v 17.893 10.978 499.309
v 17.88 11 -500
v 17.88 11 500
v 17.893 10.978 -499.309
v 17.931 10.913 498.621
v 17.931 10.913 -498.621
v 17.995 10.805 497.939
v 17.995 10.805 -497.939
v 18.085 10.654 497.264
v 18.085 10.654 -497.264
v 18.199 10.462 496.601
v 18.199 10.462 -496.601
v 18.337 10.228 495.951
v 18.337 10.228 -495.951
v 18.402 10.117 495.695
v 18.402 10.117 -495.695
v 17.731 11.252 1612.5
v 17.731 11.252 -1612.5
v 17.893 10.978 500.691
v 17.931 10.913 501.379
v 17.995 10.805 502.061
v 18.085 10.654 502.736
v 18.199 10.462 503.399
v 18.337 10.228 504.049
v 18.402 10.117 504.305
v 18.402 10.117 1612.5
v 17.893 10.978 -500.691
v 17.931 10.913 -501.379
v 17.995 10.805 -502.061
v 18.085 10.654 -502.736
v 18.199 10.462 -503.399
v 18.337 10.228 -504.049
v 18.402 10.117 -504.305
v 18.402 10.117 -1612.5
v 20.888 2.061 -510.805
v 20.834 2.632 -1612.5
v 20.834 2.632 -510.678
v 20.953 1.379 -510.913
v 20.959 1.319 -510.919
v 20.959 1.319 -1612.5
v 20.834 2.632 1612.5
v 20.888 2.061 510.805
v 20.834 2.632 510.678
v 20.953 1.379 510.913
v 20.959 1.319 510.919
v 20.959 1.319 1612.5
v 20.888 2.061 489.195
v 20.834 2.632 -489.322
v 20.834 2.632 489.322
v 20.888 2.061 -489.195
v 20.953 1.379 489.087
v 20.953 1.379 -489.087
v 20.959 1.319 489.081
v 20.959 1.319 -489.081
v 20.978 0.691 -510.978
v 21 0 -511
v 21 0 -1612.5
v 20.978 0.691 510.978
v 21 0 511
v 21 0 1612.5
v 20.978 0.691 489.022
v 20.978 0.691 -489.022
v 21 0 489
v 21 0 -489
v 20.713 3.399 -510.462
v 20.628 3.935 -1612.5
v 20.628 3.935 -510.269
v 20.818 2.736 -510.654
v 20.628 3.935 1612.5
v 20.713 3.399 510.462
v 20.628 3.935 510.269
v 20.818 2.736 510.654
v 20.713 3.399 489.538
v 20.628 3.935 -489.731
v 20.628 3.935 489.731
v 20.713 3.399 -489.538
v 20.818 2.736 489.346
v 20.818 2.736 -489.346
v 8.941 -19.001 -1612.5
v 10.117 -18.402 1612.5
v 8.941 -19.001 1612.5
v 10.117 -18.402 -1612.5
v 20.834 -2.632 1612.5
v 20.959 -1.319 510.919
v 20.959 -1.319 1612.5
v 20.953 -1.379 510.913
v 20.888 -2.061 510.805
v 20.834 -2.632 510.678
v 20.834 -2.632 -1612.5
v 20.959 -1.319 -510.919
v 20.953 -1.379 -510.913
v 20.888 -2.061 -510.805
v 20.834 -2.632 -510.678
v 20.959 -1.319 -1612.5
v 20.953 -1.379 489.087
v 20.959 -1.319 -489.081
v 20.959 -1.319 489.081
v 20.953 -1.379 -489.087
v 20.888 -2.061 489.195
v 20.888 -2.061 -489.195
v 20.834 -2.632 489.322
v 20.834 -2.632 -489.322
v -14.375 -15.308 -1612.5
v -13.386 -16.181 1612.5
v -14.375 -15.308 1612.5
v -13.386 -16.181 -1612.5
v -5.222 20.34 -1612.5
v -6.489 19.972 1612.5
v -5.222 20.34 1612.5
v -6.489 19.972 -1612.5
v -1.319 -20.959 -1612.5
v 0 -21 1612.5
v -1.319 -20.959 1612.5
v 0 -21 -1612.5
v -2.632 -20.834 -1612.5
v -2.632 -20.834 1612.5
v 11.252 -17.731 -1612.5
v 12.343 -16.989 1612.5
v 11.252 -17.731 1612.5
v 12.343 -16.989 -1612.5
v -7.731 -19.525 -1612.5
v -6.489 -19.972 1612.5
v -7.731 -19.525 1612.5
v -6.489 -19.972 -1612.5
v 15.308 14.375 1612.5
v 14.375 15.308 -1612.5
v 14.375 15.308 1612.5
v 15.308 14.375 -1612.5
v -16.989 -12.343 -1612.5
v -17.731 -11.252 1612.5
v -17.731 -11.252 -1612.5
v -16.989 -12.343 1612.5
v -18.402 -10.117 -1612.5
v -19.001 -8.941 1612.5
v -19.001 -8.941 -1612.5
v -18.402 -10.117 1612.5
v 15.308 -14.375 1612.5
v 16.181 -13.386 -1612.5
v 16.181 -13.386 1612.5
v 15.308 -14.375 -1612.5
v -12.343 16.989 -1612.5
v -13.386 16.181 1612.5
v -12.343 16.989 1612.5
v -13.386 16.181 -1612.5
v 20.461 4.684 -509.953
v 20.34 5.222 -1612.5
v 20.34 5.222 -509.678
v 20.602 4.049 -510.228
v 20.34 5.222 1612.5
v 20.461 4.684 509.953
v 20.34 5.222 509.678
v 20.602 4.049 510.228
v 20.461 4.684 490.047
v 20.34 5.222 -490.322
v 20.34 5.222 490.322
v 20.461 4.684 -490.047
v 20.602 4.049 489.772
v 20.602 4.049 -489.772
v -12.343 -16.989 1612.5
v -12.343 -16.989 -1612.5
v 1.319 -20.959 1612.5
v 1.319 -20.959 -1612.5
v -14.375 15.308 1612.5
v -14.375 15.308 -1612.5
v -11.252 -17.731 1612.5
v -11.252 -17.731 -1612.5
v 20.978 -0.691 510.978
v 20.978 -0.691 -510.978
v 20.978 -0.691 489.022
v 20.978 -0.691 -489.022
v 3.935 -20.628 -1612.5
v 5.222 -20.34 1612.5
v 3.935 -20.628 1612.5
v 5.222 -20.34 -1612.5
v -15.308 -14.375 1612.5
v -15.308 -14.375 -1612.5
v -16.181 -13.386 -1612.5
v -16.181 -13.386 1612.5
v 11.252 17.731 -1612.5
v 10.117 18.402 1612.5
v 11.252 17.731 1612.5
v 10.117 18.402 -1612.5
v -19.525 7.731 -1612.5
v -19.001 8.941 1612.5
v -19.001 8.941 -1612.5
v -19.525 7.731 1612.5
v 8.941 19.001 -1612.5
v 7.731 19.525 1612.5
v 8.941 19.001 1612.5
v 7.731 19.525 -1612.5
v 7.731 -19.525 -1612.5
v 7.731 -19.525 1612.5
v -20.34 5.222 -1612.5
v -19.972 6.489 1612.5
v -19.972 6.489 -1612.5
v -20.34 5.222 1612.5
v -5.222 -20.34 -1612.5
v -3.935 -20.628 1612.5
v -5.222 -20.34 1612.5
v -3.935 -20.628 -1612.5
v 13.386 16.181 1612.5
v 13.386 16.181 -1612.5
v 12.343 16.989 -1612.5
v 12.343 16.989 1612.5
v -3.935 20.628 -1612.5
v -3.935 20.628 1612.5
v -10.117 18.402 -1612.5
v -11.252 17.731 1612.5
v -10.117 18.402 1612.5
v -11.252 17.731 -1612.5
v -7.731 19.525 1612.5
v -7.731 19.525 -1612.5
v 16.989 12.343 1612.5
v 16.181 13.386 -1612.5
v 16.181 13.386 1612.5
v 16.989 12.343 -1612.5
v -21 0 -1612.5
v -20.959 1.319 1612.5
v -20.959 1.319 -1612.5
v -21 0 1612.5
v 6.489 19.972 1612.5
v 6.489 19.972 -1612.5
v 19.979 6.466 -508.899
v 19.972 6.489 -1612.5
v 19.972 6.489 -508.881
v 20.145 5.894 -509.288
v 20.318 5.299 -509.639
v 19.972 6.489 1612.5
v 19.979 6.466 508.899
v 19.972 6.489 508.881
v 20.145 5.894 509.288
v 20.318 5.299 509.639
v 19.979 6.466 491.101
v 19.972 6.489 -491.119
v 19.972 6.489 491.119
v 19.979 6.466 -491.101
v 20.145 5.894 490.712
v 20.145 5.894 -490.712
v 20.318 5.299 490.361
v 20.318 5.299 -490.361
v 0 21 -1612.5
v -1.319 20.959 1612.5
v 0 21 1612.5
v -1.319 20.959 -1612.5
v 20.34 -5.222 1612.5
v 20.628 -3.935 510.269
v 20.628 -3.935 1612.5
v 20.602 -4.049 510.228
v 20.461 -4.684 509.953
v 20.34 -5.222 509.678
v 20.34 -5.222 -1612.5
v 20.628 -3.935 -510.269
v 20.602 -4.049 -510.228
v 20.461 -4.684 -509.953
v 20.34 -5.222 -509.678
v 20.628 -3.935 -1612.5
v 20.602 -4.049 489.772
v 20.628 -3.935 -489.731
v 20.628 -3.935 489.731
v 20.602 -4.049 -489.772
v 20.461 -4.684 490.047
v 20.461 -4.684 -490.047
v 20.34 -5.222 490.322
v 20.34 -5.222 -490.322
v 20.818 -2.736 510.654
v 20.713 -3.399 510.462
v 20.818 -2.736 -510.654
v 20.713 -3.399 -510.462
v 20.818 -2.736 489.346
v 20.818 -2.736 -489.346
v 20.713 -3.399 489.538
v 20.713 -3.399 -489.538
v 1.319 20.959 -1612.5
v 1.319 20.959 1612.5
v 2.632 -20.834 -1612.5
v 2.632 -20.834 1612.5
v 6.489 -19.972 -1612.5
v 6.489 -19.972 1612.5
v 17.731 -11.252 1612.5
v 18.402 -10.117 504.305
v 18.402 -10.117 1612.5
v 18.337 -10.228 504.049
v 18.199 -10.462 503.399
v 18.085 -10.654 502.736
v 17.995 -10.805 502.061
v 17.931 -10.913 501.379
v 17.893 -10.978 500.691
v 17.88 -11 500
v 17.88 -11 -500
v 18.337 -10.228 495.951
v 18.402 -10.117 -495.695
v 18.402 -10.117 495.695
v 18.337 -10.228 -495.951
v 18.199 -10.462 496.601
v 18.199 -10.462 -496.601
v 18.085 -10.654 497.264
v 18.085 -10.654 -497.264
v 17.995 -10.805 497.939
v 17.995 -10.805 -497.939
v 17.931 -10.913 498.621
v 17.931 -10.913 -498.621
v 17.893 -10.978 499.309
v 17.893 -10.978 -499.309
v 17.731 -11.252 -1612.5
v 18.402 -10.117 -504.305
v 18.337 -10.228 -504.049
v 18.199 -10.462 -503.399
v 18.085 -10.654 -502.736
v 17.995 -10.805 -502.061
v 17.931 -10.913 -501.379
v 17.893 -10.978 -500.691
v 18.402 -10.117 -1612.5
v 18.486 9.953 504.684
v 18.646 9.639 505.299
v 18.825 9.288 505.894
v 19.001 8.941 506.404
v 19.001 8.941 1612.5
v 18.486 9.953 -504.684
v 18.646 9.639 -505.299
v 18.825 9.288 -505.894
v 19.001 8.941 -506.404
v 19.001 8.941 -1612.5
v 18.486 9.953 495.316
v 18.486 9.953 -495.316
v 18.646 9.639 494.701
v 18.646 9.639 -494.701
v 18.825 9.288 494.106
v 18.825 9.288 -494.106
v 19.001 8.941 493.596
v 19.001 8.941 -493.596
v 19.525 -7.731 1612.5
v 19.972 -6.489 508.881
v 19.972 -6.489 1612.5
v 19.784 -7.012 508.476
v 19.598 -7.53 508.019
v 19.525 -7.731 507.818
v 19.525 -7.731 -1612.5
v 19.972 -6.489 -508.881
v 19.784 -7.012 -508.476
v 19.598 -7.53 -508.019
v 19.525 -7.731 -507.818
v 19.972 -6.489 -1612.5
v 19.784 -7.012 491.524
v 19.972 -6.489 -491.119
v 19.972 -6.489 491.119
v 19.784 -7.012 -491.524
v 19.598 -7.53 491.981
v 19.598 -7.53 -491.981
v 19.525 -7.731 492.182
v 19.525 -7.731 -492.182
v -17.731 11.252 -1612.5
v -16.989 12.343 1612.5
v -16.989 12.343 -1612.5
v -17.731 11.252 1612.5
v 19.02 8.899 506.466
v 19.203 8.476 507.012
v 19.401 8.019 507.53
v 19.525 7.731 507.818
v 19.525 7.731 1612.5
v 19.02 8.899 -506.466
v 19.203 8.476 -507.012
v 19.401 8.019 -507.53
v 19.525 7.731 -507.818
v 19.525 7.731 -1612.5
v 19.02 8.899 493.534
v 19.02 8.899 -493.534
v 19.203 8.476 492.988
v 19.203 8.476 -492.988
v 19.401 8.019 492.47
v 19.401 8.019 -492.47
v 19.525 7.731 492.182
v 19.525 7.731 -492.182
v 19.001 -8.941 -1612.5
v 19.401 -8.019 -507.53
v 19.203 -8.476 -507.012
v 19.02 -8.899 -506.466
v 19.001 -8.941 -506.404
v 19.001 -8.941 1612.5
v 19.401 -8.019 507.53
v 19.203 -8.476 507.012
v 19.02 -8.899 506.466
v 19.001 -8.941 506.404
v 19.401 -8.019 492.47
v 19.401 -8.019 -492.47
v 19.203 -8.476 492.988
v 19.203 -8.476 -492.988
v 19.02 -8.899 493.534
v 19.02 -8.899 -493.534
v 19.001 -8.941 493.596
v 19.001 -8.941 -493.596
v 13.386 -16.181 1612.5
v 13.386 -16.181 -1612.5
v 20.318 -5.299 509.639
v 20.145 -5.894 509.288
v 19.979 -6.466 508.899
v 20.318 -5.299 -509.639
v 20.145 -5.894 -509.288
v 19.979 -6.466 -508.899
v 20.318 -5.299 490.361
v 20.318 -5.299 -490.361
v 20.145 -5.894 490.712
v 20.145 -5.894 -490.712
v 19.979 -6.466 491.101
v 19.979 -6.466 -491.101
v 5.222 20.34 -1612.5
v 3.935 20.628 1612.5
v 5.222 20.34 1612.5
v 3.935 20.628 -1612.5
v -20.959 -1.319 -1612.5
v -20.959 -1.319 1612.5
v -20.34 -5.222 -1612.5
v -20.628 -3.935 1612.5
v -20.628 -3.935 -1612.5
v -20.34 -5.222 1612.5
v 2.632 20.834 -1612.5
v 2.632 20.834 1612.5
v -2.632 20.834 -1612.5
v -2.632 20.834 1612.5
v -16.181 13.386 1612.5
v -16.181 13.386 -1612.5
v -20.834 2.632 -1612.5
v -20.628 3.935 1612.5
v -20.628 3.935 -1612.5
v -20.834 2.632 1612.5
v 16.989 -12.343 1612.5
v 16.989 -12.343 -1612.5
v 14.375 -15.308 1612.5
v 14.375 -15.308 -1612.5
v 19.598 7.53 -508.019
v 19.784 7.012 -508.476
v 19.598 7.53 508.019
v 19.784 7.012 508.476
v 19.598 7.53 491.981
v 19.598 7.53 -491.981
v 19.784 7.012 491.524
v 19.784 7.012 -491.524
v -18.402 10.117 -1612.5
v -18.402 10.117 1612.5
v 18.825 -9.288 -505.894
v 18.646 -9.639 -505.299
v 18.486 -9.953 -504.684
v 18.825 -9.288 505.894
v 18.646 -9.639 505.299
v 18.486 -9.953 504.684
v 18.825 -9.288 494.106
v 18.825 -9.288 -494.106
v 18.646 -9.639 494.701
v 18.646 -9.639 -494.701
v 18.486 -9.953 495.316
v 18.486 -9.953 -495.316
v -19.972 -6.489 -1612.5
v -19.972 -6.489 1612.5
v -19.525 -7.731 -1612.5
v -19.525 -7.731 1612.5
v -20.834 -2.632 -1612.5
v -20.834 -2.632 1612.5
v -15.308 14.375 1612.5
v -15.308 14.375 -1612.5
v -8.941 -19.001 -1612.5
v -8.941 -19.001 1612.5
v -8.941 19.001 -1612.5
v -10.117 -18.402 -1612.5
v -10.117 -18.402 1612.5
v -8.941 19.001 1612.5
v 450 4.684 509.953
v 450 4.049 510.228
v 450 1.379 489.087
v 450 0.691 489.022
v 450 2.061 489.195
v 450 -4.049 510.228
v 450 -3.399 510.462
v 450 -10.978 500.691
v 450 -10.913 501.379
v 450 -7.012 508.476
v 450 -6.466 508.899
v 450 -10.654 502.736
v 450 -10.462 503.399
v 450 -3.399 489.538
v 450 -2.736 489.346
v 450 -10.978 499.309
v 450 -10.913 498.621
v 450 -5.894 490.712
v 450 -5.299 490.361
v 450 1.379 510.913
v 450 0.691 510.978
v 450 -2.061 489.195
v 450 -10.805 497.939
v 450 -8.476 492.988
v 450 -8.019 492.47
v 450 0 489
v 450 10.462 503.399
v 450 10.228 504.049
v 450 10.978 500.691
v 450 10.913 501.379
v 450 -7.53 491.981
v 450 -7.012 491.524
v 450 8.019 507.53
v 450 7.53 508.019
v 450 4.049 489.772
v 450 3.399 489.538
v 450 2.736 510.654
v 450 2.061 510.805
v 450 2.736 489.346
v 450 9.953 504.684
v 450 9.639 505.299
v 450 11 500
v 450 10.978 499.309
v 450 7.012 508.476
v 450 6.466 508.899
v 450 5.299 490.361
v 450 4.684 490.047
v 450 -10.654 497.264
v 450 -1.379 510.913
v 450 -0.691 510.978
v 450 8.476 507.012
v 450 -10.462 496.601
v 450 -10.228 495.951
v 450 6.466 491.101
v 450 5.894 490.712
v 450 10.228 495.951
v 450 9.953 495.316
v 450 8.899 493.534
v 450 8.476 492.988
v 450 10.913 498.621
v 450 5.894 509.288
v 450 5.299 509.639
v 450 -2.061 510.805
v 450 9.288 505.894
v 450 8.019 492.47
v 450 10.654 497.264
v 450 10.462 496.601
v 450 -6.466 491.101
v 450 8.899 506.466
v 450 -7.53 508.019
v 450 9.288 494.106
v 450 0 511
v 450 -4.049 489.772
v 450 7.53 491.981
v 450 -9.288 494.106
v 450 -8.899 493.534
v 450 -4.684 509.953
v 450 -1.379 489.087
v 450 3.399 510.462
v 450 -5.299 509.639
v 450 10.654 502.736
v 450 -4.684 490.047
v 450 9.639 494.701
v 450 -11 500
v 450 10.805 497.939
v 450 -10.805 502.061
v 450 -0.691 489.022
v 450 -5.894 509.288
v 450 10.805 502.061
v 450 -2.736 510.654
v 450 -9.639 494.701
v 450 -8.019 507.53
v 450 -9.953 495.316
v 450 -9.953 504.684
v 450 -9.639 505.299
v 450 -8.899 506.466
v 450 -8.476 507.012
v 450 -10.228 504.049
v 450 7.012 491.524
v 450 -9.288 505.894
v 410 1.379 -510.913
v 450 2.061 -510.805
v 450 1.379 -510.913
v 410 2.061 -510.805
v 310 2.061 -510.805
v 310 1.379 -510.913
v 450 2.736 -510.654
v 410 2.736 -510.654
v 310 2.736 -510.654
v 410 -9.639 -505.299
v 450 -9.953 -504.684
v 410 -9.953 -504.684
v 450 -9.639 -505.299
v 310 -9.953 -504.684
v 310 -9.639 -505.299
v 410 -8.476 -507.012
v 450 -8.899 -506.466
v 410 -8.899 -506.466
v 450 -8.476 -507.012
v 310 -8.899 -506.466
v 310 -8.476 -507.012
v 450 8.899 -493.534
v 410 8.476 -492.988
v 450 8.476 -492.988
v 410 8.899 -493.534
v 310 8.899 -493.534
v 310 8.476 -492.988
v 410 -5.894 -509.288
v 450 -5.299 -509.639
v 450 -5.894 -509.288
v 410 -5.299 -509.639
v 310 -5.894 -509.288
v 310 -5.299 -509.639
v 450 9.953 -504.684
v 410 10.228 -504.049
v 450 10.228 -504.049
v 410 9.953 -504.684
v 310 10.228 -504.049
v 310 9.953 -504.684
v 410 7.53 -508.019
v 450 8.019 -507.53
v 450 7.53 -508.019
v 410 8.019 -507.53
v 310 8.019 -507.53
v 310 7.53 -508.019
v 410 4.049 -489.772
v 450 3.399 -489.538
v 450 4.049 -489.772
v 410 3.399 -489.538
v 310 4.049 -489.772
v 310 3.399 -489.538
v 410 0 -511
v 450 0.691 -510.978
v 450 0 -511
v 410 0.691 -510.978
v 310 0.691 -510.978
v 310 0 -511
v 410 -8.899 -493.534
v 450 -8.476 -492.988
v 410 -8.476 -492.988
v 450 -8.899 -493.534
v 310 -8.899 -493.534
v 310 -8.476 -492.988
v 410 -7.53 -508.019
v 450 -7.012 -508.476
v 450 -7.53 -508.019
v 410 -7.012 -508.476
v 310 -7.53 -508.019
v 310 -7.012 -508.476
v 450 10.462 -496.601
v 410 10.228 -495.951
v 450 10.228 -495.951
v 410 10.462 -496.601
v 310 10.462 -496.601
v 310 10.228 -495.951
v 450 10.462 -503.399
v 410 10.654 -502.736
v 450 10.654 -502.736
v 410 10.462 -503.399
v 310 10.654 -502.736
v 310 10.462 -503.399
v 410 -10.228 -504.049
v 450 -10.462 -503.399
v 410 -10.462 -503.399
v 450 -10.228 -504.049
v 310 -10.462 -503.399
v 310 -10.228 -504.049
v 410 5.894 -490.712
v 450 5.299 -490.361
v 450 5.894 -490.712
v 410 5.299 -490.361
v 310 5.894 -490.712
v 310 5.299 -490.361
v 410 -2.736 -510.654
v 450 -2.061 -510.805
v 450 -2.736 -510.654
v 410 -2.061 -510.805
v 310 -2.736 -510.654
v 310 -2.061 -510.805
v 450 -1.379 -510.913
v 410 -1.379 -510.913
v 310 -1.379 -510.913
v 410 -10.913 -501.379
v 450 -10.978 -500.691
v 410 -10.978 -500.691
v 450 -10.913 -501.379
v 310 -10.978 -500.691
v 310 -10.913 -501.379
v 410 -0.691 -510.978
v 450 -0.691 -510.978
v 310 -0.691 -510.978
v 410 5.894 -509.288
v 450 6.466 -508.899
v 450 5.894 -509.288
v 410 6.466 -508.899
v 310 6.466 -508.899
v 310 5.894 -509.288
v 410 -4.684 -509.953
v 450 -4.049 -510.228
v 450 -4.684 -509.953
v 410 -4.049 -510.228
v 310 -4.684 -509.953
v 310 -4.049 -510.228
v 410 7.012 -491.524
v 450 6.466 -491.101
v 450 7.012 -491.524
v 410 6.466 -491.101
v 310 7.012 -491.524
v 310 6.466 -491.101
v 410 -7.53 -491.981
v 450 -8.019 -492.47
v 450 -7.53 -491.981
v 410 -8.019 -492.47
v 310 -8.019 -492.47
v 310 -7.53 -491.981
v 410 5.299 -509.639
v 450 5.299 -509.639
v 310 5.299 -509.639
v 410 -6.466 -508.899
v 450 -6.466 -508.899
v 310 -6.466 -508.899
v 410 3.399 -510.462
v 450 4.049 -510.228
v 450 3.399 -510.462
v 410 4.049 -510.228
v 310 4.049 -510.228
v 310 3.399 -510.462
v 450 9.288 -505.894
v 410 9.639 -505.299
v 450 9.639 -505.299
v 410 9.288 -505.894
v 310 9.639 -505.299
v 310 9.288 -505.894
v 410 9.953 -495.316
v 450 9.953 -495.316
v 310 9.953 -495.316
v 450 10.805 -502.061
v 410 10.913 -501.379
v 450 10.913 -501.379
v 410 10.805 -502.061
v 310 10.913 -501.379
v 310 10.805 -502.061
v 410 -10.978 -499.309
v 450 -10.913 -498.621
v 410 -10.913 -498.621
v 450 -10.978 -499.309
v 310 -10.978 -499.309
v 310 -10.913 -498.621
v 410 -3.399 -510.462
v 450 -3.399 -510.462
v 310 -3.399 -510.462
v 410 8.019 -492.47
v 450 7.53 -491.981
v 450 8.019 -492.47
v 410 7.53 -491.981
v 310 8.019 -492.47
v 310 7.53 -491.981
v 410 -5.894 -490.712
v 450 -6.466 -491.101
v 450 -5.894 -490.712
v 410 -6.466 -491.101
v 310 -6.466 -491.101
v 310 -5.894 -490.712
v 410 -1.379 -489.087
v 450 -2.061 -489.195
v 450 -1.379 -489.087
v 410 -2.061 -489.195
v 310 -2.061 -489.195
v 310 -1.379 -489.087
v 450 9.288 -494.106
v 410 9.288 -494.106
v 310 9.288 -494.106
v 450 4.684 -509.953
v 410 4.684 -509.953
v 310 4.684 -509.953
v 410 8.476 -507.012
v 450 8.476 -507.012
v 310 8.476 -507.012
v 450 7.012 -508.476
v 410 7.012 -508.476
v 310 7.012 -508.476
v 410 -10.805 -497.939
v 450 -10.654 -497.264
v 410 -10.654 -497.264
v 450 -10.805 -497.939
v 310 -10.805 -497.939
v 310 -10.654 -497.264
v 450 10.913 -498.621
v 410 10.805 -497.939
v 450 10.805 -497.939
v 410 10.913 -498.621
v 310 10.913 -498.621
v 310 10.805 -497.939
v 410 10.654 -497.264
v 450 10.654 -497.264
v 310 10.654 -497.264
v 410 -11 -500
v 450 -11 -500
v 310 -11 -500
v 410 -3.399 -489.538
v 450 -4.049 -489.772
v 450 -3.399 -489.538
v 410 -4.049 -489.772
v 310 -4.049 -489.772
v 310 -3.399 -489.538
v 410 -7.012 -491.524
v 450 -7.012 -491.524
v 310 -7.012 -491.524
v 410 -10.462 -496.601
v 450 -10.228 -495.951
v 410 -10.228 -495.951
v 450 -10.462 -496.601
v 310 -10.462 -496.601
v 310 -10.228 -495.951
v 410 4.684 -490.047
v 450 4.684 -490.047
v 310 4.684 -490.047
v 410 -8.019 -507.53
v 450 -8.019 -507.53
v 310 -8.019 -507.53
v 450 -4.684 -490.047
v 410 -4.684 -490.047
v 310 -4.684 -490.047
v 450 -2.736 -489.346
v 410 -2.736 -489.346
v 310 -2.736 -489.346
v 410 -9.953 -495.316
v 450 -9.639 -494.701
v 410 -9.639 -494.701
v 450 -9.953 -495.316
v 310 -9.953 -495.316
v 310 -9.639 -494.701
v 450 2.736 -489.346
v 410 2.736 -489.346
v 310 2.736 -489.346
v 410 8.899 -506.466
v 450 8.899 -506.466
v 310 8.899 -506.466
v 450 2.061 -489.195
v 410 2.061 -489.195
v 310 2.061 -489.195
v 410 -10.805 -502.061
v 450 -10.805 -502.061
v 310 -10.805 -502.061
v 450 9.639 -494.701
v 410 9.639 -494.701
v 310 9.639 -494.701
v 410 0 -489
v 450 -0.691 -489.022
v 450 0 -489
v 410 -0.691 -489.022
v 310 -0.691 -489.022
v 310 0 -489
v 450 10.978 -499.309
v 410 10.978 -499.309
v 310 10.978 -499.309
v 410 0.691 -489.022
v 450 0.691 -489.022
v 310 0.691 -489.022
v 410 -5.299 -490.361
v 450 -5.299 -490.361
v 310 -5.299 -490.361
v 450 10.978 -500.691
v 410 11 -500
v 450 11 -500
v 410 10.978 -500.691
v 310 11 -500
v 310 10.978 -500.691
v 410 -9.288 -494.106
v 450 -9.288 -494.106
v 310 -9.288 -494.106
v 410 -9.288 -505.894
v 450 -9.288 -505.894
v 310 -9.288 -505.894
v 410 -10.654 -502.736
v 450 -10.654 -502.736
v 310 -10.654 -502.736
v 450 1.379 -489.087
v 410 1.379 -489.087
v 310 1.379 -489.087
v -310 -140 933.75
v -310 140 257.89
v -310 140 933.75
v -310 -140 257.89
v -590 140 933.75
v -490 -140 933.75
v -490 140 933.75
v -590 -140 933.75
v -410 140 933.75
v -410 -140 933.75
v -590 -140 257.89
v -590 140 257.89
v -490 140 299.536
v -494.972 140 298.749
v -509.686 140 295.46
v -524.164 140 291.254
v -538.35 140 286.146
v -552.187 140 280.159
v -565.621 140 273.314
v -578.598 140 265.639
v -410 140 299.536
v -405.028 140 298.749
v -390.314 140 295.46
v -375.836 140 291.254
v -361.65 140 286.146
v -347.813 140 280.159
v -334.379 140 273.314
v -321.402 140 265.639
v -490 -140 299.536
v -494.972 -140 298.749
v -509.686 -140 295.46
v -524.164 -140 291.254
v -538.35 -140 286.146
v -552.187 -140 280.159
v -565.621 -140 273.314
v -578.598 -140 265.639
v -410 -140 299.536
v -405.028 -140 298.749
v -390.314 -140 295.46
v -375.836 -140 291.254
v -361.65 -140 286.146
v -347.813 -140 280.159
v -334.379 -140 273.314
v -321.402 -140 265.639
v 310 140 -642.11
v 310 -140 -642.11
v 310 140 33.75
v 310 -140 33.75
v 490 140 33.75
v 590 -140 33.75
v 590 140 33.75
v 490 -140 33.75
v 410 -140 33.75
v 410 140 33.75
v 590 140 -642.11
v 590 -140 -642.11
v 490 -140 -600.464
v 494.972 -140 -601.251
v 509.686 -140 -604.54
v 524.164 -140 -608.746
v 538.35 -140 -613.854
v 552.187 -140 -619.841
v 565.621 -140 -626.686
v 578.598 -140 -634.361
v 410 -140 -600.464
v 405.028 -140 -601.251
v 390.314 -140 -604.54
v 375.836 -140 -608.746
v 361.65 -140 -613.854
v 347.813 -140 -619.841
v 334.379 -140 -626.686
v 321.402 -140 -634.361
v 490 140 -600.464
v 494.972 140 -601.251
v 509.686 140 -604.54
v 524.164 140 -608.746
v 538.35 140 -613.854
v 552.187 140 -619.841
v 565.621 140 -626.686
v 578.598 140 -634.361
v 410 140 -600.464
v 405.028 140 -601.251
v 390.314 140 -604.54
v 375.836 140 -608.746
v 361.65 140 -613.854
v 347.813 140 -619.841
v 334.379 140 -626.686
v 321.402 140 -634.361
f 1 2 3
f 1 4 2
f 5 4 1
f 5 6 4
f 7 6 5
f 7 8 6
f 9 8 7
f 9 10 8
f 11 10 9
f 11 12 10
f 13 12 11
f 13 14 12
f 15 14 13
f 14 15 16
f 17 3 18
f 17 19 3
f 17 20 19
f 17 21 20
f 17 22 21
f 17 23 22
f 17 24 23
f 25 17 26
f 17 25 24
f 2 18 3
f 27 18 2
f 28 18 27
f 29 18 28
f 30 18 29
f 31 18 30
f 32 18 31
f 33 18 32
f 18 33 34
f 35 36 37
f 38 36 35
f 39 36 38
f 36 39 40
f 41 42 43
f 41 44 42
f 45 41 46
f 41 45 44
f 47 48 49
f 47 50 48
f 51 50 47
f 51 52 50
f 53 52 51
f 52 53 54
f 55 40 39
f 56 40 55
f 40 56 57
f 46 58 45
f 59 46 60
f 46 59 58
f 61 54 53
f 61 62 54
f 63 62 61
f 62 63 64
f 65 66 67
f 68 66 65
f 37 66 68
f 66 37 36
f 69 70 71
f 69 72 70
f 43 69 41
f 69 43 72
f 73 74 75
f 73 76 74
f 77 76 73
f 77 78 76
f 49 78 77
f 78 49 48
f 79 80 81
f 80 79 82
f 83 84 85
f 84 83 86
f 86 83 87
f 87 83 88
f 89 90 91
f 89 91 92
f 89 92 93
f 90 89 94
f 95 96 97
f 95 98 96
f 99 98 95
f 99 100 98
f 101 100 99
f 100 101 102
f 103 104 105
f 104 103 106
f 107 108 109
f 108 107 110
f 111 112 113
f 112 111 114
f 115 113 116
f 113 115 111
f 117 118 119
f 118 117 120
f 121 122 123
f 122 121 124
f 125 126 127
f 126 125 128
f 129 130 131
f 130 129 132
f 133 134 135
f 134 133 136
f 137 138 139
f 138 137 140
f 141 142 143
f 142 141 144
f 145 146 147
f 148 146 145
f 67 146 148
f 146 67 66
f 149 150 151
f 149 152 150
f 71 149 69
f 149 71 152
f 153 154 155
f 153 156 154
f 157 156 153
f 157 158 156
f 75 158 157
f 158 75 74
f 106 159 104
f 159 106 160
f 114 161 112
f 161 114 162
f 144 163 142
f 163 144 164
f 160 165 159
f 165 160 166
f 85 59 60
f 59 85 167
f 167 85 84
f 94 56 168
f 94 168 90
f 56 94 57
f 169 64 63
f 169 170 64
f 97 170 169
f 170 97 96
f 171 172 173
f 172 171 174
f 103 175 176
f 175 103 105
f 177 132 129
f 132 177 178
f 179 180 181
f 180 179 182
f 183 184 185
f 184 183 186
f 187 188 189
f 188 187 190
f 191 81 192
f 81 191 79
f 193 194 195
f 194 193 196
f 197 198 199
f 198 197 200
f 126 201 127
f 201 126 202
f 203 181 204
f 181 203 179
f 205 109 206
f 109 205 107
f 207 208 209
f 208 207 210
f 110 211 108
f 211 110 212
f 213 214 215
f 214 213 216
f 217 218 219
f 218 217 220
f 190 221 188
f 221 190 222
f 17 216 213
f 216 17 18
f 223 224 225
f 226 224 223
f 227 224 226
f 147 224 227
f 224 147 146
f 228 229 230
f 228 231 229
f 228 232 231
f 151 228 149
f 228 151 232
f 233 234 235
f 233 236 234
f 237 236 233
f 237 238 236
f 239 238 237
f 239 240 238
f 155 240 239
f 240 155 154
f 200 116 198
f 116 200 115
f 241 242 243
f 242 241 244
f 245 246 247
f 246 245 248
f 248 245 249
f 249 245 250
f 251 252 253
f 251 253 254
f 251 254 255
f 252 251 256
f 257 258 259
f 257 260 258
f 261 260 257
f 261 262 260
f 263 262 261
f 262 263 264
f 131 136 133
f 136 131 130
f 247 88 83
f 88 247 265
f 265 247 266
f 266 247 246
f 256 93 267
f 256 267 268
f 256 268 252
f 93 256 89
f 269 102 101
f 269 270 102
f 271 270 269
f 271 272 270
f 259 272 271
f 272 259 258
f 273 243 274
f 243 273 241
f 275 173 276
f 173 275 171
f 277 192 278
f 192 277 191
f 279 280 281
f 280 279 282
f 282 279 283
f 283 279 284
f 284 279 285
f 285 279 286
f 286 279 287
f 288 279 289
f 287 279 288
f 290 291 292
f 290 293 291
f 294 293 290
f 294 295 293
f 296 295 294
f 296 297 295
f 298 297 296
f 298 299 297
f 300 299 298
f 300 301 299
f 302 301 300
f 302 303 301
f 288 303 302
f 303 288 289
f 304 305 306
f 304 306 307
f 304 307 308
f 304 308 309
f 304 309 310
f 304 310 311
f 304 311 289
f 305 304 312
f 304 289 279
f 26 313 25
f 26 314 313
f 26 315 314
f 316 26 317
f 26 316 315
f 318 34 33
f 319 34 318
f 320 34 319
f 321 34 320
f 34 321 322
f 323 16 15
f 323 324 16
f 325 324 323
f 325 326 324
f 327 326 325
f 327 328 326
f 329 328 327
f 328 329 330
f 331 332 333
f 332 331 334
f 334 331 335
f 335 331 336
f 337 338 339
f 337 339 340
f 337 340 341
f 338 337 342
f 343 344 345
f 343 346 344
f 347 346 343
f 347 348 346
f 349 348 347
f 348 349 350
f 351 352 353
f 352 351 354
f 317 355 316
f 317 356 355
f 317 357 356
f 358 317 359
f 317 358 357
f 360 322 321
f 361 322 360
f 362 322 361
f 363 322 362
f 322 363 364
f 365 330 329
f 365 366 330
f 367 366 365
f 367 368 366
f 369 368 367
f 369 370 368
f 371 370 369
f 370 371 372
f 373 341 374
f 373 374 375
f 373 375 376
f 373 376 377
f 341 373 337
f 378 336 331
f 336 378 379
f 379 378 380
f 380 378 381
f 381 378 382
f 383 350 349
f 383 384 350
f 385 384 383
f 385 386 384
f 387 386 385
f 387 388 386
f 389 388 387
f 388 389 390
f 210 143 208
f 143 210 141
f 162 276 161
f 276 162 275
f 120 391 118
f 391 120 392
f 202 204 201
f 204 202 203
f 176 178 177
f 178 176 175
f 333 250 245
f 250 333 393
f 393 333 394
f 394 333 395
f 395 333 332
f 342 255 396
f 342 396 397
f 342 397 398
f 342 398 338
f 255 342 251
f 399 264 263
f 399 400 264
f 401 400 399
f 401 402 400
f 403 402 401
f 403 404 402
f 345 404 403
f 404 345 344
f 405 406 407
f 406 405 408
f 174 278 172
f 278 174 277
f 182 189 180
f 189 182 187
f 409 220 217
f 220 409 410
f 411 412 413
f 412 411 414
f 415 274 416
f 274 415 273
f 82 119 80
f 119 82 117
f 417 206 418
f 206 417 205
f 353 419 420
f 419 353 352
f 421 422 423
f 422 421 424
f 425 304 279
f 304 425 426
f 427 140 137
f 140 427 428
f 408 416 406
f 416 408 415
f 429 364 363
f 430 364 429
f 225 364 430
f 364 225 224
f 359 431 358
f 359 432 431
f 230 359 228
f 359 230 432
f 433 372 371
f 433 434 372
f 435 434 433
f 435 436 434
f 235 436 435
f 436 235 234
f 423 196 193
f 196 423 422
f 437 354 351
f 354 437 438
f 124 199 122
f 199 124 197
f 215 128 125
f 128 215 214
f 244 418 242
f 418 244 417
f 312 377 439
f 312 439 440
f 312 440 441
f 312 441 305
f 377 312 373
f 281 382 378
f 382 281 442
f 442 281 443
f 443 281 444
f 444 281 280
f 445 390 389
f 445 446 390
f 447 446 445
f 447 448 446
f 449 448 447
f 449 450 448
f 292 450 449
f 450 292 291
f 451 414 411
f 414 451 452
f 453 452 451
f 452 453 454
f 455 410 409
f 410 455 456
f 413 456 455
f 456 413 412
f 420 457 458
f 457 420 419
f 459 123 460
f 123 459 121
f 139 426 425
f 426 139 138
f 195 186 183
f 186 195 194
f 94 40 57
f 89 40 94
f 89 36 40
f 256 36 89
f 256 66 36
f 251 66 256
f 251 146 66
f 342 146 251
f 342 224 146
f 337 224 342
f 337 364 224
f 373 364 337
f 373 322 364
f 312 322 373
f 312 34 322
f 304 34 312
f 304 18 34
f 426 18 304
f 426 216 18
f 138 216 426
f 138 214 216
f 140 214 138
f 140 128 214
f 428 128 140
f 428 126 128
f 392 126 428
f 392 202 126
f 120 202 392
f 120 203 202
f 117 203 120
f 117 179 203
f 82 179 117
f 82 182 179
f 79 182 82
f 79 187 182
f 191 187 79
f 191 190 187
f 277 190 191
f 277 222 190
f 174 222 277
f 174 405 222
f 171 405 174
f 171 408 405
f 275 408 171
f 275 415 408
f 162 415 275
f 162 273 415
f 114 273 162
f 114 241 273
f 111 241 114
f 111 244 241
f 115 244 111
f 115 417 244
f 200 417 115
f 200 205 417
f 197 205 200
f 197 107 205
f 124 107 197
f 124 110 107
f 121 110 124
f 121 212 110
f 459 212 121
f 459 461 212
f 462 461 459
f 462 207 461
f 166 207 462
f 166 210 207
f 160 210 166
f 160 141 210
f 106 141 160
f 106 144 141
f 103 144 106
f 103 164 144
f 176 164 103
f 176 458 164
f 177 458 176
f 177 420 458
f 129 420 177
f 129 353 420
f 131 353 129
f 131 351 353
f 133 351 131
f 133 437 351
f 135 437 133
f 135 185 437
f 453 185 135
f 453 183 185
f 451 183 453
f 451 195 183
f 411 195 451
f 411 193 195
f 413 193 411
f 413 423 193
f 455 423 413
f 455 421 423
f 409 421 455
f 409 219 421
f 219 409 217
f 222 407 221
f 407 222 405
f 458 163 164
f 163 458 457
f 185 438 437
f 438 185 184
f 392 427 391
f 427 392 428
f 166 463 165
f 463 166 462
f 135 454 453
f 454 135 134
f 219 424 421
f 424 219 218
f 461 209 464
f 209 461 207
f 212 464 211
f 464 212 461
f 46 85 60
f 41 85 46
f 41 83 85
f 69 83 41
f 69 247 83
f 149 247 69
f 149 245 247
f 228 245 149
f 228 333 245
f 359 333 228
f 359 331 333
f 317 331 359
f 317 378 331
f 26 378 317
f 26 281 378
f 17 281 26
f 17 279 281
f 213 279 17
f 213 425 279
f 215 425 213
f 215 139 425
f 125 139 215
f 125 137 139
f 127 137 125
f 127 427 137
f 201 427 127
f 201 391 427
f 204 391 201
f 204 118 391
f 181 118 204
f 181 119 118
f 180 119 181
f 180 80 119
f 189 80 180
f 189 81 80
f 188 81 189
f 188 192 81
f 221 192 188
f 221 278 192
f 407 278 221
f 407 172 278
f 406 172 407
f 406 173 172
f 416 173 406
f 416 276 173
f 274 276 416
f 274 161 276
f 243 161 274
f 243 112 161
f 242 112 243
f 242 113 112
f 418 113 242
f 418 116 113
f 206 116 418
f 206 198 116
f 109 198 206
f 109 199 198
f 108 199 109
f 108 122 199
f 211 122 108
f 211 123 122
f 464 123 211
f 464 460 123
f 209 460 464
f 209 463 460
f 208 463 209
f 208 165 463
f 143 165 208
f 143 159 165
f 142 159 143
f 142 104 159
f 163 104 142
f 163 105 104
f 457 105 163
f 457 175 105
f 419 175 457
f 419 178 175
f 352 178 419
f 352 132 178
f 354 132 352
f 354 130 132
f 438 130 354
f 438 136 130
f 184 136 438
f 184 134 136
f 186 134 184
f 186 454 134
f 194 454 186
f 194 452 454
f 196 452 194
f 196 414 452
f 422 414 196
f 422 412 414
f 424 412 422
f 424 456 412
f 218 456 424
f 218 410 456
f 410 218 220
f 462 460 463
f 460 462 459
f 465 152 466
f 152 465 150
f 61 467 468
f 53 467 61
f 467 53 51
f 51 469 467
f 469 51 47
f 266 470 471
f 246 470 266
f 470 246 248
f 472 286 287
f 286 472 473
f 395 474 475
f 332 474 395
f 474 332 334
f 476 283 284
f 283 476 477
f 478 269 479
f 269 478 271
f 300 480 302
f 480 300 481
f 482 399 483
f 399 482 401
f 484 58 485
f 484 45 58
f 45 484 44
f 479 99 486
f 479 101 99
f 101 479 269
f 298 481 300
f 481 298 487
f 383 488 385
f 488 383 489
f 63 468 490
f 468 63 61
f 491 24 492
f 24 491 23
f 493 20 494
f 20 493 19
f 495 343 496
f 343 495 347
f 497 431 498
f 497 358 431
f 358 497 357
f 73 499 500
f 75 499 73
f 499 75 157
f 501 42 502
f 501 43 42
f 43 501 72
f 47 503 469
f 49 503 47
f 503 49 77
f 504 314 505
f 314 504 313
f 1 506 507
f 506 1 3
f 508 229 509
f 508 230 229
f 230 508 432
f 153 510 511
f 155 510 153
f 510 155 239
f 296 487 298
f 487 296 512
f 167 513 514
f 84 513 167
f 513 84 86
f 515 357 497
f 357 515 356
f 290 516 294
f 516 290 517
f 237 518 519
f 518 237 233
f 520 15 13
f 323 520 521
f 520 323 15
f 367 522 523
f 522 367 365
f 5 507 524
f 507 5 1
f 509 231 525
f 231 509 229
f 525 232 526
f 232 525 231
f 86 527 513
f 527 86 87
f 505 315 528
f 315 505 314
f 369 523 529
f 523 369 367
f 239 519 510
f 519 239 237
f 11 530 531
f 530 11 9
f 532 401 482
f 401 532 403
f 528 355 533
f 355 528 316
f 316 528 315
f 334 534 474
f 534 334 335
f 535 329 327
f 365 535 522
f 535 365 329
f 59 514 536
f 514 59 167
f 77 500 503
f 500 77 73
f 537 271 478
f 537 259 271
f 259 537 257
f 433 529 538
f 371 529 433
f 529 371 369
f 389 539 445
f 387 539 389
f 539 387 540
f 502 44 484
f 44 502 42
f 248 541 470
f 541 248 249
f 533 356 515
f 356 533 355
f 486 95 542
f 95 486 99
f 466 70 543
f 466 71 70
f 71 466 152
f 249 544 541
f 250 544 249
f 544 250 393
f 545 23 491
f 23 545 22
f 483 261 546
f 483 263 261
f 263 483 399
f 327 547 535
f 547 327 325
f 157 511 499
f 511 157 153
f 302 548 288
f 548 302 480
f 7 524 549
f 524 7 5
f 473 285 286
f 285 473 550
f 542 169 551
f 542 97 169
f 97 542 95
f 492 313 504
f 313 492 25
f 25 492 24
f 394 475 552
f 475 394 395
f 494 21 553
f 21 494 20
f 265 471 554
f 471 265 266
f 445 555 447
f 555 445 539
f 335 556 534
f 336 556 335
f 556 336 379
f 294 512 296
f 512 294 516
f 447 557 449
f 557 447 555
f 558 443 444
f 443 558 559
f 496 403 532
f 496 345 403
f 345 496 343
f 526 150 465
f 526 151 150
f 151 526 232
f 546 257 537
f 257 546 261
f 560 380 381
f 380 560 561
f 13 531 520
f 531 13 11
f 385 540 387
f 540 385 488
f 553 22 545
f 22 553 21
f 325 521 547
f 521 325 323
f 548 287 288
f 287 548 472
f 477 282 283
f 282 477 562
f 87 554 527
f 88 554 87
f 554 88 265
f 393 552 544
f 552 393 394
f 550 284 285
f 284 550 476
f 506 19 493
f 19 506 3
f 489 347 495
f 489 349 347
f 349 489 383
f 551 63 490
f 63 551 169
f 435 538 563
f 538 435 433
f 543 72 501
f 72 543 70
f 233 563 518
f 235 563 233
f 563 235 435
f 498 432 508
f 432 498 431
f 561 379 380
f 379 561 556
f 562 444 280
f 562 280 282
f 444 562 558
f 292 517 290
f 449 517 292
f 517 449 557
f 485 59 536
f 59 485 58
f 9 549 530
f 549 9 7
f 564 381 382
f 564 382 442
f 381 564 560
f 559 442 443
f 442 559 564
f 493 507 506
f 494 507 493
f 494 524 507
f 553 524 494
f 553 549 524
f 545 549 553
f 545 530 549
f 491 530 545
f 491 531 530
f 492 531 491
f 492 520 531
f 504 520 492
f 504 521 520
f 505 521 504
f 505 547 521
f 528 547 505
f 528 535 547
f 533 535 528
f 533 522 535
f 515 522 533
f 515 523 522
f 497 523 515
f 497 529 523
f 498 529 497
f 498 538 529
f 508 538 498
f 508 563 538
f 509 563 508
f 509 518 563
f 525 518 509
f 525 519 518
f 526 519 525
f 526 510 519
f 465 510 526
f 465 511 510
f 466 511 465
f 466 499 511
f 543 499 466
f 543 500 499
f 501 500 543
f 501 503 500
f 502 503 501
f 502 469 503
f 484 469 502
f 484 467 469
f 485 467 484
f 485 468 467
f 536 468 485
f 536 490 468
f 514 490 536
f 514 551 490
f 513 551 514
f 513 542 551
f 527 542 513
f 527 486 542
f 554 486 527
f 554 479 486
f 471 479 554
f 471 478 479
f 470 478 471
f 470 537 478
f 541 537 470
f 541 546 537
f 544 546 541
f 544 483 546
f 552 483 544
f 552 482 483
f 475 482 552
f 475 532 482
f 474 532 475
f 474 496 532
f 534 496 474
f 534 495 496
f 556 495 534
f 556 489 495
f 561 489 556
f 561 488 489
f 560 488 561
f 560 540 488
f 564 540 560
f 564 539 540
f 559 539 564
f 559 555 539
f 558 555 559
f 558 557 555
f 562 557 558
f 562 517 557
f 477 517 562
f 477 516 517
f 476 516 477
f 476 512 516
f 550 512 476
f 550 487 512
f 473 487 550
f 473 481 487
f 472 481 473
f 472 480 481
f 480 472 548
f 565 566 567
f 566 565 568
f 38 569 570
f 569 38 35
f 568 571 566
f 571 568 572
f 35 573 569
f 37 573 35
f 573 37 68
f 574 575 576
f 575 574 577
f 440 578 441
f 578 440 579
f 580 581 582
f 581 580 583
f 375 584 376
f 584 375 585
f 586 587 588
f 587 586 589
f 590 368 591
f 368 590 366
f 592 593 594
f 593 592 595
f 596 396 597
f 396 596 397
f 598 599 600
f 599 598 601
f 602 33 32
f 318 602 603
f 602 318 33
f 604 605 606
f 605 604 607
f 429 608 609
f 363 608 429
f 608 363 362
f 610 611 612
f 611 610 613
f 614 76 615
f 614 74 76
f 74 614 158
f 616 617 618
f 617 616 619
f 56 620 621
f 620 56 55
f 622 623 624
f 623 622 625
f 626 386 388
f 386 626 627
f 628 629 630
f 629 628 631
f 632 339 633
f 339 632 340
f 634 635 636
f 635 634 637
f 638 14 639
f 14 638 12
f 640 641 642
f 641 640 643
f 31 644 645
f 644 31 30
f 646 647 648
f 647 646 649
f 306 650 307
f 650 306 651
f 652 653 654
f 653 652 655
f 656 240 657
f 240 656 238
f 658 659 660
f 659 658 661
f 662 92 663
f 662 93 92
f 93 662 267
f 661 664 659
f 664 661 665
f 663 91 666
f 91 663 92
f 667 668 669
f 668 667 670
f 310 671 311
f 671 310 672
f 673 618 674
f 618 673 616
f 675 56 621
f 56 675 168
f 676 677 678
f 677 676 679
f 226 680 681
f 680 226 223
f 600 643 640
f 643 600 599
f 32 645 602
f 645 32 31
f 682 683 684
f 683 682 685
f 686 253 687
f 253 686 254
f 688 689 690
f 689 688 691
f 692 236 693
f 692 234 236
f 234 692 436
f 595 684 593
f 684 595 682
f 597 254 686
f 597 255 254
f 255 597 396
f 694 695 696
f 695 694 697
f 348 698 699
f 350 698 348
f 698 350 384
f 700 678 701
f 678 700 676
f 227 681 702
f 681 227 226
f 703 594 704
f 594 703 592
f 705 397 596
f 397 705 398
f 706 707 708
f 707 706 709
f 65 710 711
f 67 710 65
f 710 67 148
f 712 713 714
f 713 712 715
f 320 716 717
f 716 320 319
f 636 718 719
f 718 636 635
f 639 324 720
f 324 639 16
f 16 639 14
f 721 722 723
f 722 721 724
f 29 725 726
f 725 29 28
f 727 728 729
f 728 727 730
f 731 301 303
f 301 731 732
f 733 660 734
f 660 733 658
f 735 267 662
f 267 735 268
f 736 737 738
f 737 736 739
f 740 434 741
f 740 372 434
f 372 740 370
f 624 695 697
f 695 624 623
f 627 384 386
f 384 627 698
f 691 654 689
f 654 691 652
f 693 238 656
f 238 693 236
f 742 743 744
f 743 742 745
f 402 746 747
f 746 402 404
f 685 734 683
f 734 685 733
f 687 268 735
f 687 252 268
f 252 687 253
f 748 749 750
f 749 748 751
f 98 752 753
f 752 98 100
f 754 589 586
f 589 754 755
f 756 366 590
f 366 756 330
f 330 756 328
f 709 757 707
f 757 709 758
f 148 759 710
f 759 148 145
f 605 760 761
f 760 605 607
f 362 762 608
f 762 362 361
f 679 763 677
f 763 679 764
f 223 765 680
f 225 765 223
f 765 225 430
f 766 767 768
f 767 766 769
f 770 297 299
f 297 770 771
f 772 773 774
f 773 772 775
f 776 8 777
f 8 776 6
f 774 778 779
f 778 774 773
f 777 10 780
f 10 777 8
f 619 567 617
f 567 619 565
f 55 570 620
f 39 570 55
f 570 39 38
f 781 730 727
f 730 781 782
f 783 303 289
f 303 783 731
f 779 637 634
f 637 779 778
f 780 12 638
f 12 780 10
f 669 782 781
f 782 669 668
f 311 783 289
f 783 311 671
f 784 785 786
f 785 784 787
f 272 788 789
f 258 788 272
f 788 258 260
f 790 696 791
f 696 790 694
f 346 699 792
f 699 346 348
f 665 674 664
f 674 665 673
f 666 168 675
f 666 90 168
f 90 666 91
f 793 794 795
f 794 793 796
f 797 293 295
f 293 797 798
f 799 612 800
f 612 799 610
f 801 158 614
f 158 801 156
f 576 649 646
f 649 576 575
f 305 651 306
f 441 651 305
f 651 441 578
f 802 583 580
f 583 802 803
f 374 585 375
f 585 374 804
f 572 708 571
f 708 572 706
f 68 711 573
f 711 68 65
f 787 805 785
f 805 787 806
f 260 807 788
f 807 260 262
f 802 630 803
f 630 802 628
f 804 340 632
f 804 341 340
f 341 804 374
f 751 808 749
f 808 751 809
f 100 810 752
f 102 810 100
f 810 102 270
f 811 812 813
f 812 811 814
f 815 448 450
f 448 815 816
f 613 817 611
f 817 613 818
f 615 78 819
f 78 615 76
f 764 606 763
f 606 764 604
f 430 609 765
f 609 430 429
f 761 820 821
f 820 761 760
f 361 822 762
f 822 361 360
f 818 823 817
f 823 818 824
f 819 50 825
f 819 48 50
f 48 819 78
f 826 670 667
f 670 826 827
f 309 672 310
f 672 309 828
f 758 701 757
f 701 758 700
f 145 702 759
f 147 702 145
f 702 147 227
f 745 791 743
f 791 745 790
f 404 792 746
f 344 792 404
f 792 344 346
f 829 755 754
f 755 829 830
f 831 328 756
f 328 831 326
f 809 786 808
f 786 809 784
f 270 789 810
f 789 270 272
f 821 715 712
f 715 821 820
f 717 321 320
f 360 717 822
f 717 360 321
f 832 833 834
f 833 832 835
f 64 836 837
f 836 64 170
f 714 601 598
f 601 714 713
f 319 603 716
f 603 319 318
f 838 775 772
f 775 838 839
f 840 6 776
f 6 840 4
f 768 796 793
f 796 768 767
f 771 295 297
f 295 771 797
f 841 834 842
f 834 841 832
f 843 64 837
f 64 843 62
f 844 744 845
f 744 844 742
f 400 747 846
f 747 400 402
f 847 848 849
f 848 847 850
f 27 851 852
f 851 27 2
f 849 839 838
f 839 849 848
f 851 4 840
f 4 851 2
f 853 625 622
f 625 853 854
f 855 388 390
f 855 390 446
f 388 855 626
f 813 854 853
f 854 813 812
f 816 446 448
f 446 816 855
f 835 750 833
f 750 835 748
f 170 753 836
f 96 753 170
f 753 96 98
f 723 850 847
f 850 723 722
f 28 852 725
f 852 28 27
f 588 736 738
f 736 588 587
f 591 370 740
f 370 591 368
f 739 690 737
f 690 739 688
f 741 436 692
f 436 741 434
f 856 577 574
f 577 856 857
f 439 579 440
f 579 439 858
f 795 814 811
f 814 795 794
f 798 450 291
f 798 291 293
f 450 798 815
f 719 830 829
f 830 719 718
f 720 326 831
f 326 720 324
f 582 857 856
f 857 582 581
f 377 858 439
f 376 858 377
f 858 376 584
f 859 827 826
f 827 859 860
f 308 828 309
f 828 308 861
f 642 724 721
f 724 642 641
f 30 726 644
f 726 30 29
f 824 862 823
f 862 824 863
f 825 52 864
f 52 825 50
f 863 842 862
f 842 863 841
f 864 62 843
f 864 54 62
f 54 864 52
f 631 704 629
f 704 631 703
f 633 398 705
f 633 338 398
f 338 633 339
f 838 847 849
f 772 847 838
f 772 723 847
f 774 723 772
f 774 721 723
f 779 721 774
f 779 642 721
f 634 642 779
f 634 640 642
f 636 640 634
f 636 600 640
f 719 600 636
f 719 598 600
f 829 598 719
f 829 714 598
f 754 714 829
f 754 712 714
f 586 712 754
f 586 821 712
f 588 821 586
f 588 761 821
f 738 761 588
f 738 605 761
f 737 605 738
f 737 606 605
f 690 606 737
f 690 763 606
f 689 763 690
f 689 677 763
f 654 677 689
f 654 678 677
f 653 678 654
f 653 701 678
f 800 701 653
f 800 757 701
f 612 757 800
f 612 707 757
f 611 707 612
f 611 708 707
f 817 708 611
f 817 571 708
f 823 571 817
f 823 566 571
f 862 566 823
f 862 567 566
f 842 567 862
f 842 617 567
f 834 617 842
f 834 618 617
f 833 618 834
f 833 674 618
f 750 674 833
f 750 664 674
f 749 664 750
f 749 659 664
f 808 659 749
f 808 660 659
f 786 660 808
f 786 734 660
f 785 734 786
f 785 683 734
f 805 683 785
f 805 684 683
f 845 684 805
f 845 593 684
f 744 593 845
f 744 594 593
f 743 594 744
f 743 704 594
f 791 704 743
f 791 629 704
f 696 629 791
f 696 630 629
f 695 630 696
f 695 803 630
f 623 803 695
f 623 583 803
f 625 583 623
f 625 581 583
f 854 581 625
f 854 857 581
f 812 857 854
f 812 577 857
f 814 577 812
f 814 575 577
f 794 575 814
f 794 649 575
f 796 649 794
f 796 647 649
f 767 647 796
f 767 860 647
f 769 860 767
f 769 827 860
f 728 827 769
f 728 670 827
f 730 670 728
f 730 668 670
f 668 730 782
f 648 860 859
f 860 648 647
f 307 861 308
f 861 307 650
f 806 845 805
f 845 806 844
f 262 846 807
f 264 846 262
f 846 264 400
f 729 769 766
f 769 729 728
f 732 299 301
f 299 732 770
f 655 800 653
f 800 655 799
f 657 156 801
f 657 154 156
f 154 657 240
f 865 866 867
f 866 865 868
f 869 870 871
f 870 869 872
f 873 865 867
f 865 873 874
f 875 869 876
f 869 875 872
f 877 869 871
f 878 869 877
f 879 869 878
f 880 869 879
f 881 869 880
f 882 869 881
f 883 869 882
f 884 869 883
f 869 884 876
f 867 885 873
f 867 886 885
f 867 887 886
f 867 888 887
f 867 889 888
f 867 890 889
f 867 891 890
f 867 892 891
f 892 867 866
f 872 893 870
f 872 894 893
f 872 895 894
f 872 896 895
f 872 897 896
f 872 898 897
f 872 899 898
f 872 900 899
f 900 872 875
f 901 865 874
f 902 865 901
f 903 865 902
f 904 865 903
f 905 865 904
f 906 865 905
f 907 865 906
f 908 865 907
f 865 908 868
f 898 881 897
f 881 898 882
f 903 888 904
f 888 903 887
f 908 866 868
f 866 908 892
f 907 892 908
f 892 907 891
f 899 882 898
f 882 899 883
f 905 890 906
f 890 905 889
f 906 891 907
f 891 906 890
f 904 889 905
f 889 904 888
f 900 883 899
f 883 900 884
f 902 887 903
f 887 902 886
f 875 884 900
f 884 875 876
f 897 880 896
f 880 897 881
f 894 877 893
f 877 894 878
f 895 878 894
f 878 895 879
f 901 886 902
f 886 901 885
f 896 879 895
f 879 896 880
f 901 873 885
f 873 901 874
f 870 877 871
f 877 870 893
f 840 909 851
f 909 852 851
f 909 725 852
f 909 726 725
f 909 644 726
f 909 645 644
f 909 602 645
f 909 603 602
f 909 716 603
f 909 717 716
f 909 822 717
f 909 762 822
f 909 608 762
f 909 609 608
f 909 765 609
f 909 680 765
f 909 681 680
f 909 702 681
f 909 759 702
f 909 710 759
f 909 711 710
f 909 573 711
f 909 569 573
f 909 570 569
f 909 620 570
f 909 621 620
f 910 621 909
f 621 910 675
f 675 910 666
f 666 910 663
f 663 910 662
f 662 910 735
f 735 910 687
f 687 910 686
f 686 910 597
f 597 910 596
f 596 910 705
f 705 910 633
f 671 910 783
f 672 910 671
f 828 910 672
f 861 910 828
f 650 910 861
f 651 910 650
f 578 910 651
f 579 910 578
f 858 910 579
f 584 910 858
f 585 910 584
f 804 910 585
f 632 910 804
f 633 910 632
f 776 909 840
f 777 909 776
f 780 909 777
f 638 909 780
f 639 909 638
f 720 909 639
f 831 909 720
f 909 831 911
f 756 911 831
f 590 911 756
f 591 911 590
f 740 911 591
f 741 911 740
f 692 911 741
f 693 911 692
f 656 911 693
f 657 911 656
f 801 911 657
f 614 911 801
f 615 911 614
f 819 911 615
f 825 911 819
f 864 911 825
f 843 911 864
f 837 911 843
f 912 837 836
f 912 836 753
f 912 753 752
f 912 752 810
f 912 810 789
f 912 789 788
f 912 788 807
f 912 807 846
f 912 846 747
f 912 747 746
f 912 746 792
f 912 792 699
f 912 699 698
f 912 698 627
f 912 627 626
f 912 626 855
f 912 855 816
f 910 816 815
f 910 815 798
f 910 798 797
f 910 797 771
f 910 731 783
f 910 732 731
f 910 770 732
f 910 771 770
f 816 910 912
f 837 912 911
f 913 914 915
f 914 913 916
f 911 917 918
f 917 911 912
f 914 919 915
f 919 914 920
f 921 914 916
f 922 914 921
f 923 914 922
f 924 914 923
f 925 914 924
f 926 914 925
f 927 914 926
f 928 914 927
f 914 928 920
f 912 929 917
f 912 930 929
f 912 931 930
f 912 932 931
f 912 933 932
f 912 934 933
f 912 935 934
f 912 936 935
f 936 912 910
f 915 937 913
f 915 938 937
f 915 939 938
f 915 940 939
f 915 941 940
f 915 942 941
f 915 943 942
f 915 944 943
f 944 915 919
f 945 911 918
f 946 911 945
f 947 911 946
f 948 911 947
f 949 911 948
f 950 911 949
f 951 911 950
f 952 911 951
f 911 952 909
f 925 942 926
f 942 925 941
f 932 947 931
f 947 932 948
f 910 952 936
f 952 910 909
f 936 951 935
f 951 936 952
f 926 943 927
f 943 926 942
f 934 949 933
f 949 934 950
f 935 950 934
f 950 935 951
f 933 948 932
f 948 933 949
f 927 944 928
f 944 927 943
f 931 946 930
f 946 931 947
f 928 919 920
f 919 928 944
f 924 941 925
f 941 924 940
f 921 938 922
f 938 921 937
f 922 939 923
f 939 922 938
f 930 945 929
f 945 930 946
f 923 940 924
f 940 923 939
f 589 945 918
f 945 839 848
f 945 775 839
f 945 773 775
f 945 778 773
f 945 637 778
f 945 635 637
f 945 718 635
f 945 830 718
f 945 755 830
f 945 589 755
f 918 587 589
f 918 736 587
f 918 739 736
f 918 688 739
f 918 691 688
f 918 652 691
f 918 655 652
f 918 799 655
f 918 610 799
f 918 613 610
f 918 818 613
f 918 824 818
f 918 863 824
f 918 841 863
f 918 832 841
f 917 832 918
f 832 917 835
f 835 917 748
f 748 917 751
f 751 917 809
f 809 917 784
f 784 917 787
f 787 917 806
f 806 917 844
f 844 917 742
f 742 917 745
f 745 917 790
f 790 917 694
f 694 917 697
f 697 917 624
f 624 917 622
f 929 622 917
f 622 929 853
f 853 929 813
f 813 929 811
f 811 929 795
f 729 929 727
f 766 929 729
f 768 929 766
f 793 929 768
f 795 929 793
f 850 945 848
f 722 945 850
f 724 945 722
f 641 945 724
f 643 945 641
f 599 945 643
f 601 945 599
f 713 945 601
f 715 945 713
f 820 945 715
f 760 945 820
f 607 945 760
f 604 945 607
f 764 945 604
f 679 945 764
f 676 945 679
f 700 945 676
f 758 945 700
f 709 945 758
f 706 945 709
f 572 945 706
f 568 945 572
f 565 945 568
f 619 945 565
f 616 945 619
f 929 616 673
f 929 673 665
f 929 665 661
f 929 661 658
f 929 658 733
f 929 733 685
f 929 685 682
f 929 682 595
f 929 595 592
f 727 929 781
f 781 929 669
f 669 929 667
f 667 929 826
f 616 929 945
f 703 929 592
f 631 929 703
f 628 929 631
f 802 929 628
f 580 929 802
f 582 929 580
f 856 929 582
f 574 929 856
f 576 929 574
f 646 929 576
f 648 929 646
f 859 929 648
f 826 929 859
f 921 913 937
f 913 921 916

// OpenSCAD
// ============================================================================
// PROJECT: XXXG-00W0 WING GUNDAM ZERO EW - AIRFRAME SKELETAL MATRIX
// COMPONENT VAULT: BANDAI CAST RUNNER B - UPPER ARM BONES B13 & B14
// INTEGRATION CONFIG: HYDRAULIC-FREE DUAL-MOTION CYCLOIDAL ELBOW SOCKETS
// ELECTRICAL SPECS: SOLID-STATE CAST-IN POWER RAILS FOR SQUARE-WAVE BUS
// ============================================================================

$fn = 100; // Circular segment resolution calculation count

// Structural Constants Scaled 1:1 for a 16.7-Meter Airframe Scale (mm)
upper_arm_length = 2150;                // Total longitudinal upper arm axis (mm)
elbow_socket_bore = 480;                // Cycloidal gear housing track outer diameter (mm)
skeletal_core_wall = 55;                // Thick TiAl interior structural bone thickness (mm)
harness_conduit_width = 80;             // Cast-in 4oz copper logic trace track width (mm)

module Runner_B_Arm_Forge() {
    // Central Supply Injection Runner Axis (Molten Feed Line from Siphon Forge)
    color([0.22, 0.22, 0.24]) {
        cylinder(h = upper_arm_length * 1.5, d = 42, center = true);
        // Direct injection gates tracking straight into the part cavity blocks
        translate([0, 0, 500]) rotate([0, 90, 0]) cylinder(h = 450, d = 22);
        translate([0, 0, -500]) rotate([0, 90, 0]) cylinder(h = 450, d = 22);
    }
    
    // Instantiate Scaled Skeutomorphic Part Molds Symmetrically
    Cast_Internal_Arm_Bones();
}

module Cast_Internal_Arm_Bones() {
    // ---- PART B13: INTERNAL LEFT UPPER ARM SKELETAL FRAME ---- [Page 6, Step 4]
    translate([-450, 0, 450]) color([0.4, 0.4, 0.42]) {
        difference() {
            // Main solid internal bone backbone column
            cube([280, 280, upper_arm_length * 0.45], center = true);
            
            // Integrated Cycloidal Elbow Interface Socket Bore
            translate([0, 0, -(upper_arm_length * 0.18)])
                rotate([90, 0, 0])
                    cylinder(h = 300, d = elbow_socket_bore, center = true);
            
            // Continuous cast-in routing track for the 4oz solid-state wiring rails
            cube([harness_conduit_width, 300, upper_arm_length], center = true);
        }
    }
    
    // ---- PART B14: INTERNAL RIGHT UPPER ARM SKELETAL FRAME ---- [Page 6, Step 3]
    translate([450, 0, -450]) rotate([0, 0, 180]) color([0.4, 0.4, 0.42]) {
        difference() {
            cube([280, 280, upper_arm_length * 0.45], center = true);
            translate([0, 0, -(upper_arm_length * 0.18)])
                rotate([90, 0, 0])
                    cylinder(h = 300, d = elbow_socket_bore, center = true);
            cube([harness_conduit_width, 300, upper_arm_length], center = true);
        }
    }
}

// Render Master Assembly to Parameter Workspace
Runner_B_Arm_Forge();
